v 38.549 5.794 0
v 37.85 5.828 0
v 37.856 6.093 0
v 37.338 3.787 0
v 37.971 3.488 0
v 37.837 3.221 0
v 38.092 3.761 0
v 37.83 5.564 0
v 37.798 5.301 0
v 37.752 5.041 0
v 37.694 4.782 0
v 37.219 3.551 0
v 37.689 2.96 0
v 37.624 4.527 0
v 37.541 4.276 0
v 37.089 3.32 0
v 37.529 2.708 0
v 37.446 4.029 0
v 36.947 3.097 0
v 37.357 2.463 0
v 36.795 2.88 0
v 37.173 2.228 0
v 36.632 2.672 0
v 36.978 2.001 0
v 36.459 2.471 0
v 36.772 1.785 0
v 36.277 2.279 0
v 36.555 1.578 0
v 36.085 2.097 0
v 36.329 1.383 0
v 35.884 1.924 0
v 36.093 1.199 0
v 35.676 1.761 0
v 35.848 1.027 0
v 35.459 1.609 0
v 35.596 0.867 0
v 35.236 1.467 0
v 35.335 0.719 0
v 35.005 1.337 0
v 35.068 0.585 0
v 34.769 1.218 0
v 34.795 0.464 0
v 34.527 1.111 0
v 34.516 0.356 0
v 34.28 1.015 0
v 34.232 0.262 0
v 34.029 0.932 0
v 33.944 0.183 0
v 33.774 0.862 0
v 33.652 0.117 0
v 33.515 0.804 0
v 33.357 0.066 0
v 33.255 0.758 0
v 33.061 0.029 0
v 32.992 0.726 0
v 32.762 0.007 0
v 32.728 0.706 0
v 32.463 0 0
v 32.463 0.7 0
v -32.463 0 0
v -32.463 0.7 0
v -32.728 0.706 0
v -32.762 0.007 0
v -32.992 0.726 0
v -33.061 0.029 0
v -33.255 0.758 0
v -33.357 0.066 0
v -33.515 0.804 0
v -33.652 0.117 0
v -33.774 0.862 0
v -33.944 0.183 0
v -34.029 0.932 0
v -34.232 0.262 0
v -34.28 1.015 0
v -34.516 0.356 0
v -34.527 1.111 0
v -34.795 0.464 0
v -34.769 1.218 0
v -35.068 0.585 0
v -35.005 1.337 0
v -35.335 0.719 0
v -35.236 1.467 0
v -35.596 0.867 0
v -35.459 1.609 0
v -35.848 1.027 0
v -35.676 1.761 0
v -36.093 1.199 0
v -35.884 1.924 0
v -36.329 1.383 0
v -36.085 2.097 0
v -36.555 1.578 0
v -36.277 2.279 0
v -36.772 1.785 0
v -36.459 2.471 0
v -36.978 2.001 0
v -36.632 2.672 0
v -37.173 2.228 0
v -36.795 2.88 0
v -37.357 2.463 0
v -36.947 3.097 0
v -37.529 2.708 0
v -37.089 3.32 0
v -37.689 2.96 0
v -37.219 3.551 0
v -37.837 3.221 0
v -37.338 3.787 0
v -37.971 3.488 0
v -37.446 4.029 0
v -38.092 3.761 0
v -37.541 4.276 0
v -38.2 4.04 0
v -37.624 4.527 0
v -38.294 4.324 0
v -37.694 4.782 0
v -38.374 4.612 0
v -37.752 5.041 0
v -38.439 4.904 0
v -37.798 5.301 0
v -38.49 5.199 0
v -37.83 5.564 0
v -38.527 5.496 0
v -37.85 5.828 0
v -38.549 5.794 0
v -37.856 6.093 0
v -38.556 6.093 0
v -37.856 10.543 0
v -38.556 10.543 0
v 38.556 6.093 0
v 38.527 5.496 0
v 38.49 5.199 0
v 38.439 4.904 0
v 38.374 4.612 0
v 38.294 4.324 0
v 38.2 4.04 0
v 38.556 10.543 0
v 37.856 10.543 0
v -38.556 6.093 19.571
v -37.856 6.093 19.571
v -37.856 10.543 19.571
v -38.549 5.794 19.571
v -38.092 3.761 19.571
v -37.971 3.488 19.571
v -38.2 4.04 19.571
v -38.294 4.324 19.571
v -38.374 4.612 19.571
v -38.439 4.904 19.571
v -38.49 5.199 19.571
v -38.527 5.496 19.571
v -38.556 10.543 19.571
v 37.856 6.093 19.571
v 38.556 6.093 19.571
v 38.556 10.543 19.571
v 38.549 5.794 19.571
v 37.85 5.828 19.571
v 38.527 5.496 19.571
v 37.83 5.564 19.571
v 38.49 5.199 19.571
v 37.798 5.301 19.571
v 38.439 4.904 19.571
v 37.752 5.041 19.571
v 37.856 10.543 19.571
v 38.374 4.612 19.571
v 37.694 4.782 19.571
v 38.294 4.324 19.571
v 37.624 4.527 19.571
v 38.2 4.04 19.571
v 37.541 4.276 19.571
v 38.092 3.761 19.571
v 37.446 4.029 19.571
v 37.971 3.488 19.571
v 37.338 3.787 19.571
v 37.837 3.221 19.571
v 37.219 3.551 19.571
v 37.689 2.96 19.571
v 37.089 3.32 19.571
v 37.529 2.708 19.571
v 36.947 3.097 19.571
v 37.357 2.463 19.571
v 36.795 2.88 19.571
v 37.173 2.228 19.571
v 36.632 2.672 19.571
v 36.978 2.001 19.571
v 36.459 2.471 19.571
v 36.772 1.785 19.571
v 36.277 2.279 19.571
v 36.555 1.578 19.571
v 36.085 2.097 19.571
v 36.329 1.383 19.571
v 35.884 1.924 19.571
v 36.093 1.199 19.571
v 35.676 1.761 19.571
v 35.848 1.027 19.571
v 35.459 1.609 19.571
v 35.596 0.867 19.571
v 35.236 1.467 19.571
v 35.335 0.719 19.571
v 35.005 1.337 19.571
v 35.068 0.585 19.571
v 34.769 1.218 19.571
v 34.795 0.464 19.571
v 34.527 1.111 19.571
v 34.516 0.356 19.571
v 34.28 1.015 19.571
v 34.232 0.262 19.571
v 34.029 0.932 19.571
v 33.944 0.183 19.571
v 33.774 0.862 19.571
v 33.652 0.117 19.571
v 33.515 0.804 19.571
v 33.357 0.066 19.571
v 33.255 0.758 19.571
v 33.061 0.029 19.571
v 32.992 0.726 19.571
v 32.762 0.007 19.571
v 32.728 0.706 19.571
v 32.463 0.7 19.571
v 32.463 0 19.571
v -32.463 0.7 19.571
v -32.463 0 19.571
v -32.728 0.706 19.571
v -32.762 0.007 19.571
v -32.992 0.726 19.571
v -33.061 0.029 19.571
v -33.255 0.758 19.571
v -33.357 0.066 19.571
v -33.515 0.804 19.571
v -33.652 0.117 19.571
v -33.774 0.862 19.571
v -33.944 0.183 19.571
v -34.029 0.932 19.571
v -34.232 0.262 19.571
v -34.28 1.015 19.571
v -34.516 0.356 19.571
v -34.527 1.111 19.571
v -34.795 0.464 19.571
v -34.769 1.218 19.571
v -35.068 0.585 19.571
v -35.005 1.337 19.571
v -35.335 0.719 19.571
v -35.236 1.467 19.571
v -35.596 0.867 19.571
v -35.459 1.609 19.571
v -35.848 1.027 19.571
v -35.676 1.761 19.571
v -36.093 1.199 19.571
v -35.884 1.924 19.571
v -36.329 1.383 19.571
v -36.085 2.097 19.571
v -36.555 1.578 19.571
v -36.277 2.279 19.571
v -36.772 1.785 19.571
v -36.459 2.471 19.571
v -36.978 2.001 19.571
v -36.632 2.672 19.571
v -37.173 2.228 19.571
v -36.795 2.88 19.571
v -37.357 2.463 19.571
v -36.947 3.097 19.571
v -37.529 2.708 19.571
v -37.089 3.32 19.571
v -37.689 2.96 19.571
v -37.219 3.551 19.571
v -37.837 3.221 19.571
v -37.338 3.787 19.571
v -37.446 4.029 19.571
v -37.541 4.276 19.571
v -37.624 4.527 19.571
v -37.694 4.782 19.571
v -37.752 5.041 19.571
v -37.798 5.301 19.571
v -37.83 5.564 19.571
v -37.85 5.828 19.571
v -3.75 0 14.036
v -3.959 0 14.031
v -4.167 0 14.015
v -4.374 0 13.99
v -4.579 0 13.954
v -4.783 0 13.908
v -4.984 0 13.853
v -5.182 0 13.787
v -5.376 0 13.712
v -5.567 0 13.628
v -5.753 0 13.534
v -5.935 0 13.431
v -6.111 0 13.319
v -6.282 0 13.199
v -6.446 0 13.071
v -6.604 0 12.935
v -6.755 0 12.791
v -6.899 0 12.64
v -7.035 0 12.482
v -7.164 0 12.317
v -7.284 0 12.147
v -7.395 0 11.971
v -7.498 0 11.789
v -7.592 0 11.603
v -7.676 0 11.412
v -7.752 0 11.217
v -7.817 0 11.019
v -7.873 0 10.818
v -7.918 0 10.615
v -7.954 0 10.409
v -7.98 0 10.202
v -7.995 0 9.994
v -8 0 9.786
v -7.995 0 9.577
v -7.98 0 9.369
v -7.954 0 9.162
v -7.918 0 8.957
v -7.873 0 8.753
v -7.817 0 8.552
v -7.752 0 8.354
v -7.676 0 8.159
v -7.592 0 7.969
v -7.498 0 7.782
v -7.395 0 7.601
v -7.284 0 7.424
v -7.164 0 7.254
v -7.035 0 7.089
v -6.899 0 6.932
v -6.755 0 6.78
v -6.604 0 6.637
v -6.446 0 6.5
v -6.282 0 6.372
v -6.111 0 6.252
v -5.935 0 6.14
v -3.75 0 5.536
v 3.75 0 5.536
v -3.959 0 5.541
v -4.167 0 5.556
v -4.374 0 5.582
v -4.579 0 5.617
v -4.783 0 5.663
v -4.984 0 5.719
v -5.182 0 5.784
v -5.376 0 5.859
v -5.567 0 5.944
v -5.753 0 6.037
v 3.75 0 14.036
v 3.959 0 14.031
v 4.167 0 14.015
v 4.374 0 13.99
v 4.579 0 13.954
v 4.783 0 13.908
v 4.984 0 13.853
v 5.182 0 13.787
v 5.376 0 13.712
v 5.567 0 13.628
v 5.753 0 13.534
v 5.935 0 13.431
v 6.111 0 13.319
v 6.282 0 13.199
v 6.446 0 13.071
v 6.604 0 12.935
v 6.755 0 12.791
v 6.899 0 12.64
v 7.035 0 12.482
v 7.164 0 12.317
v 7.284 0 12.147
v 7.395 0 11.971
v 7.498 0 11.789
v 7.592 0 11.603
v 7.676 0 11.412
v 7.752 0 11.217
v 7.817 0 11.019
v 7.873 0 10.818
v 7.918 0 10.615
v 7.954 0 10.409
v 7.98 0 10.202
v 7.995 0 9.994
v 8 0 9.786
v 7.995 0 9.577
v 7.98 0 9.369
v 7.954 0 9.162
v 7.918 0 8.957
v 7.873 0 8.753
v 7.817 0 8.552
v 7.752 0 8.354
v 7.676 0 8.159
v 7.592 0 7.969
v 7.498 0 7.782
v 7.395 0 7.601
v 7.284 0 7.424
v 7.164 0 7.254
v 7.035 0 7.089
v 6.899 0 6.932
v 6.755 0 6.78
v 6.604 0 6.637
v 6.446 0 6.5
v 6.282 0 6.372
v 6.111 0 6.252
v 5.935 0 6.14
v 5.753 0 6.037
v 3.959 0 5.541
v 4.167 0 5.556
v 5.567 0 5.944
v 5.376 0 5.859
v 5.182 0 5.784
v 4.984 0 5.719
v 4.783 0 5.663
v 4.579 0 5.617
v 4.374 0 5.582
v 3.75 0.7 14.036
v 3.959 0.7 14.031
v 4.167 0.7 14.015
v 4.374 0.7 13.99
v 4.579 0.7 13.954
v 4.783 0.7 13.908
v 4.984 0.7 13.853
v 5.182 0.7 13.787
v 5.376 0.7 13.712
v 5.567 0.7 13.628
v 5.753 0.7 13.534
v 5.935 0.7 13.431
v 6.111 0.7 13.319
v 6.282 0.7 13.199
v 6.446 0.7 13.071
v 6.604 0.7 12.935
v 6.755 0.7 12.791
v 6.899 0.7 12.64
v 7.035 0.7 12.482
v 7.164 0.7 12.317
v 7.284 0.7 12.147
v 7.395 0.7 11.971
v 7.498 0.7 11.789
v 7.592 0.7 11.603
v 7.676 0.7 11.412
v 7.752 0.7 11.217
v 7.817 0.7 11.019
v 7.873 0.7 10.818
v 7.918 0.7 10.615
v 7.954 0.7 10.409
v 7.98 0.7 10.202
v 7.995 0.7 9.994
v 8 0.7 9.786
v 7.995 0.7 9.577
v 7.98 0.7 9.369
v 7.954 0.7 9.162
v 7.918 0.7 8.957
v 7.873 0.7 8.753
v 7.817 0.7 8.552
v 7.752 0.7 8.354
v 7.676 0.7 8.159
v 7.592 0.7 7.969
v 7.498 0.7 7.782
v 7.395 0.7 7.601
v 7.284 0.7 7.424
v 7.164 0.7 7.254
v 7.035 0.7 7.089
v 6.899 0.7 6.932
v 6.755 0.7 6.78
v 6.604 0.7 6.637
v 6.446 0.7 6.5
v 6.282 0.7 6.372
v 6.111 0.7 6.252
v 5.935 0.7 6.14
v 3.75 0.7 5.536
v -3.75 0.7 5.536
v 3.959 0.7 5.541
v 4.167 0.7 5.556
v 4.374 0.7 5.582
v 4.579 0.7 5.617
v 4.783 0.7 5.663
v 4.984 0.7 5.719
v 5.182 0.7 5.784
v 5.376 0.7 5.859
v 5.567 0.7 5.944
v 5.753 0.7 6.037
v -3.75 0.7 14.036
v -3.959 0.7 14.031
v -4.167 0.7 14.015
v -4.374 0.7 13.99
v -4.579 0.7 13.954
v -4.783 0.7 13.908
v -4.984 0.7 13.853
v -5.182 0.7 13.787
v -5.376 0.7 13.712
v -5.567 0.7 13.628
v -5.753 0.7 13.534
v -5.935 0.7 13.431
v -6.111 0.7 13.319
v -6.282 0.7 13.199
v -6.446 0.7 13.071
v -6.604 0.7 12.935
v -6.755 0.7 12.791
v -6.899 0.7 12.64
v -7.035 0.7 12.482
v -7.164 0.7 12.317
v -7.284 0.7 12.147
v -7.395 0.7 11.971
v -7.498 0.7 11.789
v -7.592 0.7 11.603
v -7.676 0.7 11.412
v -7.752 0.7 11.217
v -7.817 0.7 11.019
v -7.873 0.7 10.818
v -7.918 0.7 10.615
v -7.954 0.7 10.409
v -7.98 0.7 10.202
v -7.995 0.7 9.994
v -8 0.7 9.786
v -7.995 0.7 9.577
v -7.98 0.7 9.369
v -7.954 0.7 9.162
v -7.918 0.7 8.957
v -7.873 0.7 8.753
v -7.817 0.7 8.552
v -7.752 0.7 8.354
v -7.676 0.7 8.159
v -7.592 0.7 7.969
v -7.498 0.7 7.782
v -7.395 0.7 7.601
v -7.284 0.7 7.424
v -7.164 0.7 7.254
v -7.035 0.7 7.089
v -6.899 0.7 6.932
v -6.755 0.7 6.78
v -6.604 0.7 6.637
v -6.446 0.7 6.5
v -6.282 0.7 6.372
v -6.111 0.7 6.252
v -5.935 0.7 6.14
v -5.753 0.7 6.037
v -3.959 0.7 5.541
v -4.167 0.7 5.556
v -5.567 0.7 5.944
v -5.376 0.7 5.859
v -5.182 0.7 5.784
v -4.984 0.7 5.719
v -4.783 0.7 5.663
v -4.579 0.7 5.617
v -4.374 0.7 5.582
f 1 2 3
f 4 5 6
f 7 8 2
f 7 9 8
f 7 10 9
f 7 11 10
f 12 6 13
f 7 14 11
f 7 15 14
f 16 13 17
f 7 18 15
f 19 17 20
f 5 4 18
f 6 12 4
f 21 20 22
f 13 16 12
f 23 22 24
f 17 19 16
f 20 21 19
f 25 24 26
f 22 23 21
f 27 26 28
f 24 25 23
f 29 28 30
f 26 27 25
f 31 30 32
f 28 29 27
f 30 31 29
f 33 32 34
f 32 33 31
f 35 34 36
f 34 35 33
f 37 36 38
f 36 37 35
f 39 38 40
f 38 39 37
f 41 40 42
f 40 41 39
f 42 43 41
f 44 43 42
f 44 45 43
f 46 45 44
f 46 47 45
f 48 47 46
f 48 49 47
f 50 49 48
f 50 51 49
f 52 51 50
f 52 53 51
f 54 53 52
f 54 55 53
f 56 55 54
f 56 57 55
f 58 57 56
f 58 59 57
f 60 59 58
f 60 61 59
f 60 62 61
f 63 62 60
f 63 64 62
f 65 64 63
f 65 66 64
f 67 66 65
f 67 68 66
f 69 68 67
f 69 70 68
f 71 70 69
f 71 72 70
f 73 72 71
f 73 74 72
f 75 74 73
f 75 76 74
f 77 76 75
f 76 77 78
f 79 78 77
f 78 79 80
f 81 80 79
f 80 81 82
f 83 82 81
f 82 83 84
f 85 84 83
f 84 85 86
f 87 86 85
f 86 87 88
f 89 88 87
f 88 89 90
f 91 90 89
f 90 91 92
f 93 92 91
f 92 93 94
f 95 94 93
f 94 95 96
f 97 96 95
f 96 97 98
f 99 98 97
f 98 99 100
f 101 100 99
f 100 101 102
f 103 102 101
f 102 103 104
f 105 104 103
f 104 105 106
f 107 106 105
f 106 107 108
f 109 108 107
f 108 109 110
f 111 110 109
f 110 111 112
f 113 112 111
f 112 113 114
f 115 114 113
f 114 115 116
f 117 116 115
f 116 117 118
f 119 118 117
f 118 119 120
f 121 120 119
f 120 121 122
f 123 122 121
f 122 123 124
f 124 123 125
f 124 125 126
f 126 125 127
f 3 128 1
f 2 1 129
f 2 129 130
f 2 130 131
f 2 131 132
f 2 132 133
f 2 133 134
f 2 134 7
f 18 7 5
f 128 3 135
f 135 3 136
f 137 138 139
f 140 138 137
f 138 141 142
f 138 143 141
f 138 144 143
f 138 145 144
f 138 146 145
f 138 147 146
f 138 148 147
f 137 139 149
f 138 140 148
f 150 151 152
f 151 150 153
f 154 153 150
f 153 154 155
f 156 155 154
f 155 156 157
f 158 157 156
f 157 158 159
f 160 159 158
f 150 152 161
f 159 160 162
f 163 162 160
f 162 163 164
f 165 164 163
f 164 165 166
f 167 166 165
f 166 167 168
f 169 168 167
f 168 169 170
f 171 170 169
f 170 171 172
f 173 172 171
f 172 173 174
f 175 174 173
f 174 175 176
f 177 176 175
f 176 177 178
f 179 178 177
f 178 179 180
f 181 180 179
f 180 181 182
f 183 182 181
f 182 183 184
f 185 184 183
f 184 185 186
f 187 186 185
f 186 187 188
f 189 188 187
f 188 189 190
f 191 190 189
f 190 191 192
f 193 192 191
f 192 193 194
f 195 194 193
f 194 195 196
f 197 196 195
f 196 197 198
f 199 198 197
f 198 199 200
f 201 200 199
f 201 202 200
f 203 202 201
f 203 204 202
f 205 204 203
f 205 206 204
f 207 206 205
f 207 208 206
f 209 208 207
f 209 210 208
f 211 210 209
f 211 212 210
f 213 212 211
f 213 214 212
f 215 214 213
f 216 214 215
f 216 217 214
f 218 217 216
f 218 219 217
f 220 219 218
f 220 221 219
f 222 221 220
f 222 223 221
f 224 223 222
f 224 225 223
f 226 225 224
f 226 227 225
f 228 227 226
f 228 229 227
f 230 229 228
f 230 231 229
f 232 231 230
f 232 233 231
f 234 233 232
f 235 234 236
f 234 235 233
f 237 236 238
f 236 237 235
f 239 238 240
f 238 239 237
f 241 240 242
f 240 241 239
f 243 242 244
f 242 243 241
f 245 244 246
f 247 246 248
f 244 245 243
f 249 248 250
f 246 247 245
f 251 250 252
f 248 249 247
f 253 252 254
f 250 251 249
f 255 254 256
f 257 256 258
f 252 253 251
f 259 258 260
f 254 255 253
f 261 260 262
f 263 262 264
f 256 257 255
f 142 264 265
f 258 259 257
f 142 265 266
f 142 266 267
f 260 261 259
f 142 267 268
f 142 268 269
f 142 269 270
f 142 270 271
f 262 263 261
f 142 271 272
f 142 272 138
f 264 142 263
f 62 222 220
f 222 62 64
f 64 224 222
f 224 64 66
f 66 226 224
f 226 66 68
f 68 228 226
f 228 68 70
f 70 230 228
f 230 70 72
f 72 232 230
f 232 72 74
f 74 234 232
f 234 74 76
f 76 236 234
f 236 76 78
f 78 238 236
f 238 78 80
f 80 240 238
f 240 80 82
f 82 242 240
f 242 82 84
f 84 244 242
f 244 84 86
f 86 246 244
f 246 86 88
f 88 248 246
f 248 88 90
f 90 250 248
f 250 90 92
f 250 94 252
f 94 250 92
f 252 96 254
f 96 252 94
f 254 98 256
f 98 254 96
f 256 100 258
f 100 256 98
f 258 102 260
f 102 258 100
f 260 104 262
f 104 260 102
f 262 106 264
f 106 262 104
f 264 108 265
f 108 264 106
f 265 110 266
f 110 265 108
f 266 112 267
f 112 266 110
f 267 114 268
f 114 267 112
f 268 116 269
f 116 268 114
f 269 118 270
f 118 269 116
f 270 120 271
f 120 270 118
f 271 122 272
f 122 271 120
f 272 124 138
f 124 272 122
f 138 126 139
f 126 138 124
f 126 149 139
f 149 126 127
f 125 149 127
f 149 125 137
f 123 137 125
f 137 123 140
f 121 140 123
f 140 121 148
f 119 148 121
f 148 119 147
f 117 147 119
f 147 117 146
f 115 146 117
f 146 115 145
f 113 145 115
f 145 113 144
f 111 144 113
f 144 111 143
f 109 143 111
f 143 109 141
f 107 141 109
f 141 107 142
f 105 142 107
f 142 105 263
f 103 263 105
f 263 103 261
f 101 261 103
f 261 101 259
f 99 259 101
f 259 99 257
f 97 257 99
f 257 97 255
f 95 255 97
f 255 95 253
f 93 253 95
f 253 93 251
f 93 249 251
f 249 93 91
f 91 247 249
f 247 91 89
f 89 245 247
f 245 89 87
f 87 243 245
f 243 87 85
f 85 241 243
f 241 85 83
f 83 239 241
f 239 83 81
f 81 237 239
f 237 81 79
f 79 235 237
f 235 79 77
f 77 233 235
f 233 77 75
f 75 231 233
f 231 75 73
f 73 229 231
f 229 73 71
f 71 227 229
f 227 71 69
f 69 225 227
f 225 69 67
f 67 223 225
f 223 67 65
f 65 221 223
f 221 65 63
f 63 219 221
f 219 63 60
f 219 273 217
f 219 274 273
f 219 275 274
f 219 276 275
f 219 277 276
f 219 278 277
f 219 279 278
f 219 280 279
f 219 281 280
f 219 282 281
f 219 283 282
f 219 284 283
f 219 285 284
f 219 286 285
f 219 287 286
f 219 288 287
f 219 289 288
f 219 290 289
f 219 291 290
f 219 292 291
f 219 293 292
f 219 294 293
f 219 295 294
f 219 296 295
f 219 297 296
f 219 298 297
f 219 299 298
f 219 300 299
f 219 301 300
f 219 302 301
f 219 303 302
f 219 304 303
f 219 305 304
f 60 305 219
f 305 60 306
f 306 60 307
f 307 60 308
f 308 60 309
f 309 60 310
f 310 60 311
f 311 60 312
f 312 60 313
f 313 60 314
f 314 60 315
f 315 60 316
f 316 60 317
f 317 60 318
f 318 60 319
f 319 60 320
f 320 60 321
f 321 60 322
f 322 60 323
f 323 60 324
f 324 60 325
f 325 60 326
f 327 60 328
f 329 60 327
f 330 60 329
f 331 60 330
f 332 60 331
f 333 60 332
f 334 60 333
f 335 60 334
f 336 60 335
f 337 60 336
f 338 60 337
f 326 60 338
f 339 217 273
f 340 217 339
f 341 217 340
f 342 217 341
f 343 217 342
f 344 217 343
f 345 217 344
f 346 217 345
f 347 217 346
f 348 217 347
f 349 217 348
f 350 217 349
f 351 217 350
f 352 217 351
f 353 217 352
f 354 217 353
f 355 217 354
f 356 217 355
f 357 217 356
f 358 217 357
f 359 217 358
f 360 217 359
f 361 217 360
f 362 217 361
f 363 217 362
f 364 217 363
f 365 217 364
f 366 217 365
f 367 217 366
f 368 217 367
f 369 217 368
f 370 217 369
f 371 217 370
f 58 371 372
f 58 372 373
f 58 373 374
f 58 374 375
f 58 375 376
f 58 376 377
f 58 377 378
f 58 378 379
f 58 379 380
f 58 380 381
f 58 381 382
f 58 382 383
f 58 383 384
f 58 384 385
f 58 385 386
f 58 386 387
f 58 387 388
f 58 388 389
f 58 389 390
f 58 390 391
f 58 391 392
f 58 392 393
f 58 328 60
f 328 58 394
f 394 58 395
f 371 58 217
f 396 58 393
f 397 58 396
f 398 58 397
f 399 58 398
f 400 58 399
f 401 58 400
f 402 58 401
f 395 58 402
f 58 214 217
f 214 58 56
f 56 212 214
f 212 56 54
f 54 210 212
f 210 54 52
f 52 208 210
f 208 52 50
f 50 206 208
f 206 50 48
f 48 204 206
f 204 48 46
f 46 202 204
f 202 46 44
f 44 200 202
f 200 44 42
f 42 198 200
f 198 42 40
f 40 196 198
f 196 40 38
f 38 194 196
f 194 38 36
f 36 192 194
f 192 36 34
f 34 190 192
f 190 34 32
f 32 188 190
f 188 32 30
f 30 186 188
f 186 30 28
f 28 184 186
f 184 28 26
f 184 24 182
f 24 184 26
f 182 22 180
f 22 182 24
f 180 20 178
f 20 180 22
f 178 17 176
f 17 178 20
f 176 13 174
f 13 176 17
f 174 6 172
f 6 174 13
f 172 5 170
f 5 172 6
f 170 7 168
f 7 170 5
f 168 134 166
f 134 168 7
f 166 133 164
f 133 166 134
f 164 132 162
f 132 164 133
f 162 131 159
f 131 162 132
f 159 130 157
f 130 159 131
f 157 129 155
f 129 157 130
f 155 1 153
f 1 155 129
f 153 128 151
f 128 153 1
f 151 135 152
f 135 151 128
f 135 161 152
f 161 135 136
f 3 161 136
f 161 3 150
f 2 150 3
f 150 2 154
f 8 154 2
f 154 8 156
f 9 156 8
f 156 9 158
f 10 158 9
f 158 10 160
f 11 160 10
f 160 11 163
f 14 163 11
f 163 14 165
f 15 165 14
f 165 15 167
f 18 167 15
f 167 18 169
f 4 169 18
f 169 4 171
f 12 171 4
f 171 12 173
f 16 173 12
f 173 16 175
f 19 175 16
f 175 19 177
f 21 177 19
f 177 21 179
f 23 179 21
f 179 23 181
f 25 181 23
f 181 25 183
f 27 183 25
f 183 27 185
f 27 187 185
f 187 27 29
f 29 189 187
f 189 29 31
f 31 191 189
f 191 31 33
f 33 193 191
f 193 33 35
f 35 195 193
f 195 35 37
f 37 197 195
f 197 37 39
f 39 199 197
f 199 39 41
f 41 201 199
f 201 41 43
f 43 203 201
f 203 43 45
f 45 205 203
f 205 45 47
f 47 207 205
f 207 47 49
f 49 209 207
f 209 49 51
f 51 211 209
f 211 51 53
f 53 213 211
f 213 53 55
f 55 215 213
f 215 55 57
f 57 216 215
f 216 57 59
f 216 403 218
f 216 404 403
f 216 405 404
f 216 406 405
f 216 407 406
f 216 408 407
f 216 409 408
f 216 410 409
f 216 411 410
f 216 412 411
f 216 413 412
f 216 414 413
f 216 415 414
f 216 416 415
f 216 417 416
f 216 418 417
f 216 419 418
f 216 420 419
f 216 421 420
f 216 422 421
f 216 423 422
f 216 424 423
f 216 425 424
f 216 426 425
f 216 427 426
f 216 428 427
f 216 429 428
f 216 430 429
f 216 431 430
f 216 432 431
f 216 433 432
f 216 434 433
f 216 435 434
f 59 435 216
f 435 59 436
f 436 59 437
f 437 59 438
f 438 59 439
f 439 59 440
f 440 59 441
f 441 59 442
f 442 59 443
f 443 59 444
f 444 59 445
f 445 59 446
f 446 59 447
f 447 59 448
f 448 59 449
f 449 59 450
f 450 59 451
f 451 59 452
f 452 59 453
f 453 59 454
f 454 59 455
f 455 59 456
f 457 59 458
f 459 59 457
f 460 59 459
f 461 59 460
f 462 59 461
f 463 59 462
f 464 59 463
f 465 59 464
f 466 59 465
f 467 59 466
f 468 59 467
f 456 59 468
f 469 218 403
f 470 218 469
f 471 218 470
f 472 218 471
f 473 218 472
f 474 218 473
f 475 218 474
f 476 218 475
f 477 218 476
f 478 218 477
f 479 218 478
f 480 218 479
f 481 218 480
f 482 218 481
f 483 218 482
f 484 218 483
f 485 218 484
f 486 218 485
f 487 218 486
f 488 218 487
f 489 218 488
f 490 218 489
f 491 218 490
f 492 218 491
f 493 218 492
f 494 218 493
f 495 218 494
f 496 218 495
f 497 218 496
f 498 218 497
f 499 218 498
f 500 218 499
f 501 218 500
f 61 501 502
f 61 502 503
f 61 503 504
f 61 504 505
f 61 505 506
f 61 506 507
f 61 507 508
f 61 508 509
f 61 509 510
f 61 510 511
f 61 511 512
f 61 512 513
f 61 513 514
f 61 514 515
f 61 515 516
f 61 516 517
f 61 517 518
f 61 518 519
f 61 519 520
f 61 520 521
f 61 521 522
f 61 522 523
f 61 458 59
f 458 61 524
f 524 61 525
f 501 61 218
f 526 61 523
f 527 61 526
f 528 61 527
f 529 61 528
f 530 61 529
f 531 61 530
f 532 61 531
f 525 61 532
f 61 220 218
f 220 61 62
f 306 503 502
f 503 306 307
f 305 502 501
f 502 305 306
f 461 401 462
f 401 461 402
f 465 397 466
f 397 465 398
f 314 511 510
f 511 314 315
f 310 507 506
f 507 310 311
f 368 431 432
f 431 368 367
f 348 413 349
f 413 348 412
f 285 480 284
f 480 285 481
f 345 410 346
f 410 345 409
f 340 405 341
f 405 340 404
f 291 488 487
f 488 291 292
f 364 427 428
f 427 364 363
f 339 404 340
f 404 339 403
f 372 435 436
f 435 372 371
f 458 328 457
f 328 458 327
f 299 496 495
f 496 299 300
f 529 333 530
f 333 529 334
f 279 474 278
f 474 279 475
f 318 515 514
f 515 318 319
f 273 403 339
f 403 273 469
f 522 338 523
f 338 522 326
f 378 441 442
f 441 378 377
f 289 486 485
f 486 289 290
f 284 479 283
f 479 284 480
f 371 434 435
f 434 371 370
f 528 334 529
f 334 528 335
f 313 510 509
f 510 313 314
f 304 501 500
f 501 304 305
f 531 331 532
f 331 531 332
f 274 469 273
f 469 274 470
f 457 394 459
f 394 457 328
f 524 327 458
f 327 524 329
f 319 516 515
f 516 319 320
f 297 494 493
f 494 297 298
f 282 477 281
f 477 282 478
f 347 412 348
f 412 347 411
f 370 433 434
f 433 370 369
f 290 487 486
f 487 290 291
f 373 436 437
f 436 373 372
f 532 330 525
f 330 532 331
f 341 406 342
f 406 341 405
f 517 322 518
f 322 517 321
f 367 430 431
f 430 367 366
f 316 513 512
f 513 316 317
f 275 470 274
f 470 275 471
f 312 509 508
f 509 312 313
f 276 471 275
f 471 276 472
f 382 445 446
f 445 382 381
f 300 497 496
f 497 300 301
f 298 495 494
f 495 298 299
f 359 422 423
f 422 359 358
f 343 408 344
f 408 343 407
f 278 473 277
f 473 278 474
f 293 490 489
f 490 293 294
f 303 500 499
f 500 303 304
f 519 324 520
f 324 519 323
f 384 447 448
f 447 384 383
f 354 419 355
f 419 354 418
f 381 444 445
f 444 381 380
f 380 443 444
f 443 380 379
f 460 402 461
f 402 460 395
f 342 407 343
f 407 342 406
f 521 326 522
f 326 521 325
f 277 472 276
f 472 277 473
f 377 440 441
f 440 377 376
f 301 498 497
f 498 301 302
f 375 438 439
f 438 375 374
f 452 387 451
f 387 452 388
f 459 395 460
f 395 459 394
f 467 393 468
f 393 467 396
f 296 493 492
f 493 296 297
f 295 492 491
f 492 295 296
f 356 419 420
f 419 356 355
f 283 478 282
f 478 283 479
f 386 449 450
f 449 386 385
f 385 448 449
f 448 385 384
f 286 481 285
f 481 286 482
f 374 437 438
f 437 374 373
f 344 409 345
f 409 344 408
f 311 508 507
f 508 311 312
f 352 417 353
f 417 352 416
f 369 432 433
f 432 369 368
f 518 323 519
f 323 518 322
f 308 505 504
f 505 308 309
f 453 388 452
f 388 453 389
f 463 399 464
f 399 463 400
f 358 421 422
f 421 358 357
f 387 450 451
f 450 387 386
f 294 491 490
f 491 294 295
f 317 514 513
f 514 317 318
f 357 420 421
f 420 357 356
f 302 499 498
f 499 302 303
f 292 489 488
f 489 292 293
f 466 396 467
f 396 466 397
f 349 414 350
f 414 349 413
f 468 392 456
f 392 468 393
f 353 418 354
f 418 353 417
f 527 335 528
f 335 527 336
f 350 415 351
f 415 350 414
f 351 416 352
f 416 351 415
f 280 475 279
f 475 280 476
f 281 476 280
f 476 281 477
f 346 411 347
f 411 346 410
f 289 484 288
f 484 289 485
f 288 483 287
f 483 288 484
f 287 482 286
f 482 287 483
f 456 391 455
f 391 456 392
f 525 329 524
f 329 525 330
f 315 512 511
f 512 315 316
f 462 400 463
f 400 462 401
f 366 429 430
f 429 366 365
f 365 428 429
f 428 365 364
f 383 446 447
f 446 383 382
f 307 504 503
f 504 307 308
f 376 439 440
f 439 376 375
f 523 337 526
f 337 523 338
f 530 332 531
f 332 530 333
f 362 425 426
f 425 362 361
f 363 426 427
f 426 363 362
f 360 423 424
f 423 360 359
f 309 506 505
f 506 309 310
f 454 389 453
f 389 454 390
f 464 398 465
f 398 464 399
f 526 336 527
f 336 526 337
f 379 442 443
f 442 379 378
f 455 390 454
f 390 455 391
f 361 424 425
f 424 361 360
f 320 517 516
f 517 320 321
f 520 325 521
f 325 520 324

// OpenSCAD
// ============================================================
// Bottom_Cover.scad
//
// Thin U-shaped bottom/end cover
// Corrected using measured wall thickness: 0.7 mm
//
// Units: mm
//
// Orientation:
//   X = overall width
//   Y = return/wrap depth
//   Z = vertical height
// ============================================================

$fn = 128;

// ============================================================
// MEASURED BODY DIMENSIONS
// ============================================================

outer_w = 77.1122;
cover_h = 19.5713;
return_depth = 10.5435;

// Corrected material thickness
wall_t = 0.70;

// Measured straight front span between corner curves
straight_span = 64.9267;

// Corner radius inferred from width and straight span
outer_corner_r = (outer_w - straight_span) / 2;   // 6.09275 mm
inner_corner_r = outer_corner_r - wall_t;

// ============================================================
// USB-C CABLE OPENING
// ============================================================
//
// This opening is larger than a bare USB-C metal connector so
// the thicker molded plastic/rubber cable end can pass through.
//
// For an exact fit, measure your actual cable housing and add
// approximately 0.4 to 0.8 mm total clearance in each direction.
// ============================================================

usb_open_w = 16.0;
usb_open_h = 8.5;
usb_open_r = usb_open_h / 2;

usb_x = 0;
usb_z = cover_h / 2;

// ============================================================
// HELPERS
// ============================================================

module rounded_slot_2d(w, h) {
    hull() {
        translate([-(w-h)/2, 0])
            circle(d = h);

        translate([(w-h)/2, 0])
            circle(d = h);
    }
}

// ============================================================
// U-SHAPED PLAN PROFILE
// ============================================================
//
// The cover is created as three connected thin walls:
//
//   - one long flat front wall
//   - one curved return at the left end
//   - one curved return at the right end
//
// It is intentionally open on the rear side.
// ============================================================

module front_wall_profile() {
    translate([-outer_w/2 + outer_corner_r, 0])
        square([
            outer_w - outer_corner_r*2,
            wall_t
        ]);
}

module left_return_profile() {
    translate([-outer_w/2 + outer_corner_r, outer_corner_r])
    difference() {
        // Outer quarter-round corner plus straight return
        union() {
            intersection() {
                circle(r = outer_corner_r);

                translate([-outer_corner_r, -outer_corner_r])
                    square([outer_corner_r, outer_corner_r]);
            }

            translate([-outer_corner_r, 0])
                square([
                    wall_t,
                    return_depth - outer_corner_r
                ]);
        }

        // Remove inner curve, maintaining thin wall thickness
        intersection() {
            circle(r = inner_corner_r);

            translate([-inner_corner_r, -inner_corner_r])
                square([inner_corner_r, inner_corner_r]);
        }
    }
}

module right_return_profile() {
    mirror([1, 0, 0])
        left_return_profile();
}

module bottom_cover_profile_2d() {
    union() {
        front_wall_profile();
        left_return_profile();
        right_return_profile();
    }
}

// ============================================================
// BODY
// ============================================================

module cover_body() {
    linear_extrude(height = cover_h)
        bottom_cover_profile_2d();
}

// ============================================================
// USB-C OPENING
// ============================================================

module usb_opening() {
    translate([
        usb_x,
        wall_t + 0.5,
        usb_z
    ])
    rotate([90, 0, 0])
    linear_extrude(height = wall_t + 1.0)
        rounded_slot_2d(
            usb_open_w,
            usb_open_h
        );
}

// ============================================================
// FINAL PART
// ============================================================

module bottom_cover() {
    difference() {
        cover_body();
        usb_opening();
    }
}

bottom_cover();

// ============================================================
// OPTIONAL STL OVERLAY
// ============================================================
//
// Place Bottom_Cover.stl in the same folder as this file.
// Uncomment and position as needed for comparison:
//
// %scale([1000, 1000, 1000])
//     import("Bottom_Cover.stl", convexity = 10);
